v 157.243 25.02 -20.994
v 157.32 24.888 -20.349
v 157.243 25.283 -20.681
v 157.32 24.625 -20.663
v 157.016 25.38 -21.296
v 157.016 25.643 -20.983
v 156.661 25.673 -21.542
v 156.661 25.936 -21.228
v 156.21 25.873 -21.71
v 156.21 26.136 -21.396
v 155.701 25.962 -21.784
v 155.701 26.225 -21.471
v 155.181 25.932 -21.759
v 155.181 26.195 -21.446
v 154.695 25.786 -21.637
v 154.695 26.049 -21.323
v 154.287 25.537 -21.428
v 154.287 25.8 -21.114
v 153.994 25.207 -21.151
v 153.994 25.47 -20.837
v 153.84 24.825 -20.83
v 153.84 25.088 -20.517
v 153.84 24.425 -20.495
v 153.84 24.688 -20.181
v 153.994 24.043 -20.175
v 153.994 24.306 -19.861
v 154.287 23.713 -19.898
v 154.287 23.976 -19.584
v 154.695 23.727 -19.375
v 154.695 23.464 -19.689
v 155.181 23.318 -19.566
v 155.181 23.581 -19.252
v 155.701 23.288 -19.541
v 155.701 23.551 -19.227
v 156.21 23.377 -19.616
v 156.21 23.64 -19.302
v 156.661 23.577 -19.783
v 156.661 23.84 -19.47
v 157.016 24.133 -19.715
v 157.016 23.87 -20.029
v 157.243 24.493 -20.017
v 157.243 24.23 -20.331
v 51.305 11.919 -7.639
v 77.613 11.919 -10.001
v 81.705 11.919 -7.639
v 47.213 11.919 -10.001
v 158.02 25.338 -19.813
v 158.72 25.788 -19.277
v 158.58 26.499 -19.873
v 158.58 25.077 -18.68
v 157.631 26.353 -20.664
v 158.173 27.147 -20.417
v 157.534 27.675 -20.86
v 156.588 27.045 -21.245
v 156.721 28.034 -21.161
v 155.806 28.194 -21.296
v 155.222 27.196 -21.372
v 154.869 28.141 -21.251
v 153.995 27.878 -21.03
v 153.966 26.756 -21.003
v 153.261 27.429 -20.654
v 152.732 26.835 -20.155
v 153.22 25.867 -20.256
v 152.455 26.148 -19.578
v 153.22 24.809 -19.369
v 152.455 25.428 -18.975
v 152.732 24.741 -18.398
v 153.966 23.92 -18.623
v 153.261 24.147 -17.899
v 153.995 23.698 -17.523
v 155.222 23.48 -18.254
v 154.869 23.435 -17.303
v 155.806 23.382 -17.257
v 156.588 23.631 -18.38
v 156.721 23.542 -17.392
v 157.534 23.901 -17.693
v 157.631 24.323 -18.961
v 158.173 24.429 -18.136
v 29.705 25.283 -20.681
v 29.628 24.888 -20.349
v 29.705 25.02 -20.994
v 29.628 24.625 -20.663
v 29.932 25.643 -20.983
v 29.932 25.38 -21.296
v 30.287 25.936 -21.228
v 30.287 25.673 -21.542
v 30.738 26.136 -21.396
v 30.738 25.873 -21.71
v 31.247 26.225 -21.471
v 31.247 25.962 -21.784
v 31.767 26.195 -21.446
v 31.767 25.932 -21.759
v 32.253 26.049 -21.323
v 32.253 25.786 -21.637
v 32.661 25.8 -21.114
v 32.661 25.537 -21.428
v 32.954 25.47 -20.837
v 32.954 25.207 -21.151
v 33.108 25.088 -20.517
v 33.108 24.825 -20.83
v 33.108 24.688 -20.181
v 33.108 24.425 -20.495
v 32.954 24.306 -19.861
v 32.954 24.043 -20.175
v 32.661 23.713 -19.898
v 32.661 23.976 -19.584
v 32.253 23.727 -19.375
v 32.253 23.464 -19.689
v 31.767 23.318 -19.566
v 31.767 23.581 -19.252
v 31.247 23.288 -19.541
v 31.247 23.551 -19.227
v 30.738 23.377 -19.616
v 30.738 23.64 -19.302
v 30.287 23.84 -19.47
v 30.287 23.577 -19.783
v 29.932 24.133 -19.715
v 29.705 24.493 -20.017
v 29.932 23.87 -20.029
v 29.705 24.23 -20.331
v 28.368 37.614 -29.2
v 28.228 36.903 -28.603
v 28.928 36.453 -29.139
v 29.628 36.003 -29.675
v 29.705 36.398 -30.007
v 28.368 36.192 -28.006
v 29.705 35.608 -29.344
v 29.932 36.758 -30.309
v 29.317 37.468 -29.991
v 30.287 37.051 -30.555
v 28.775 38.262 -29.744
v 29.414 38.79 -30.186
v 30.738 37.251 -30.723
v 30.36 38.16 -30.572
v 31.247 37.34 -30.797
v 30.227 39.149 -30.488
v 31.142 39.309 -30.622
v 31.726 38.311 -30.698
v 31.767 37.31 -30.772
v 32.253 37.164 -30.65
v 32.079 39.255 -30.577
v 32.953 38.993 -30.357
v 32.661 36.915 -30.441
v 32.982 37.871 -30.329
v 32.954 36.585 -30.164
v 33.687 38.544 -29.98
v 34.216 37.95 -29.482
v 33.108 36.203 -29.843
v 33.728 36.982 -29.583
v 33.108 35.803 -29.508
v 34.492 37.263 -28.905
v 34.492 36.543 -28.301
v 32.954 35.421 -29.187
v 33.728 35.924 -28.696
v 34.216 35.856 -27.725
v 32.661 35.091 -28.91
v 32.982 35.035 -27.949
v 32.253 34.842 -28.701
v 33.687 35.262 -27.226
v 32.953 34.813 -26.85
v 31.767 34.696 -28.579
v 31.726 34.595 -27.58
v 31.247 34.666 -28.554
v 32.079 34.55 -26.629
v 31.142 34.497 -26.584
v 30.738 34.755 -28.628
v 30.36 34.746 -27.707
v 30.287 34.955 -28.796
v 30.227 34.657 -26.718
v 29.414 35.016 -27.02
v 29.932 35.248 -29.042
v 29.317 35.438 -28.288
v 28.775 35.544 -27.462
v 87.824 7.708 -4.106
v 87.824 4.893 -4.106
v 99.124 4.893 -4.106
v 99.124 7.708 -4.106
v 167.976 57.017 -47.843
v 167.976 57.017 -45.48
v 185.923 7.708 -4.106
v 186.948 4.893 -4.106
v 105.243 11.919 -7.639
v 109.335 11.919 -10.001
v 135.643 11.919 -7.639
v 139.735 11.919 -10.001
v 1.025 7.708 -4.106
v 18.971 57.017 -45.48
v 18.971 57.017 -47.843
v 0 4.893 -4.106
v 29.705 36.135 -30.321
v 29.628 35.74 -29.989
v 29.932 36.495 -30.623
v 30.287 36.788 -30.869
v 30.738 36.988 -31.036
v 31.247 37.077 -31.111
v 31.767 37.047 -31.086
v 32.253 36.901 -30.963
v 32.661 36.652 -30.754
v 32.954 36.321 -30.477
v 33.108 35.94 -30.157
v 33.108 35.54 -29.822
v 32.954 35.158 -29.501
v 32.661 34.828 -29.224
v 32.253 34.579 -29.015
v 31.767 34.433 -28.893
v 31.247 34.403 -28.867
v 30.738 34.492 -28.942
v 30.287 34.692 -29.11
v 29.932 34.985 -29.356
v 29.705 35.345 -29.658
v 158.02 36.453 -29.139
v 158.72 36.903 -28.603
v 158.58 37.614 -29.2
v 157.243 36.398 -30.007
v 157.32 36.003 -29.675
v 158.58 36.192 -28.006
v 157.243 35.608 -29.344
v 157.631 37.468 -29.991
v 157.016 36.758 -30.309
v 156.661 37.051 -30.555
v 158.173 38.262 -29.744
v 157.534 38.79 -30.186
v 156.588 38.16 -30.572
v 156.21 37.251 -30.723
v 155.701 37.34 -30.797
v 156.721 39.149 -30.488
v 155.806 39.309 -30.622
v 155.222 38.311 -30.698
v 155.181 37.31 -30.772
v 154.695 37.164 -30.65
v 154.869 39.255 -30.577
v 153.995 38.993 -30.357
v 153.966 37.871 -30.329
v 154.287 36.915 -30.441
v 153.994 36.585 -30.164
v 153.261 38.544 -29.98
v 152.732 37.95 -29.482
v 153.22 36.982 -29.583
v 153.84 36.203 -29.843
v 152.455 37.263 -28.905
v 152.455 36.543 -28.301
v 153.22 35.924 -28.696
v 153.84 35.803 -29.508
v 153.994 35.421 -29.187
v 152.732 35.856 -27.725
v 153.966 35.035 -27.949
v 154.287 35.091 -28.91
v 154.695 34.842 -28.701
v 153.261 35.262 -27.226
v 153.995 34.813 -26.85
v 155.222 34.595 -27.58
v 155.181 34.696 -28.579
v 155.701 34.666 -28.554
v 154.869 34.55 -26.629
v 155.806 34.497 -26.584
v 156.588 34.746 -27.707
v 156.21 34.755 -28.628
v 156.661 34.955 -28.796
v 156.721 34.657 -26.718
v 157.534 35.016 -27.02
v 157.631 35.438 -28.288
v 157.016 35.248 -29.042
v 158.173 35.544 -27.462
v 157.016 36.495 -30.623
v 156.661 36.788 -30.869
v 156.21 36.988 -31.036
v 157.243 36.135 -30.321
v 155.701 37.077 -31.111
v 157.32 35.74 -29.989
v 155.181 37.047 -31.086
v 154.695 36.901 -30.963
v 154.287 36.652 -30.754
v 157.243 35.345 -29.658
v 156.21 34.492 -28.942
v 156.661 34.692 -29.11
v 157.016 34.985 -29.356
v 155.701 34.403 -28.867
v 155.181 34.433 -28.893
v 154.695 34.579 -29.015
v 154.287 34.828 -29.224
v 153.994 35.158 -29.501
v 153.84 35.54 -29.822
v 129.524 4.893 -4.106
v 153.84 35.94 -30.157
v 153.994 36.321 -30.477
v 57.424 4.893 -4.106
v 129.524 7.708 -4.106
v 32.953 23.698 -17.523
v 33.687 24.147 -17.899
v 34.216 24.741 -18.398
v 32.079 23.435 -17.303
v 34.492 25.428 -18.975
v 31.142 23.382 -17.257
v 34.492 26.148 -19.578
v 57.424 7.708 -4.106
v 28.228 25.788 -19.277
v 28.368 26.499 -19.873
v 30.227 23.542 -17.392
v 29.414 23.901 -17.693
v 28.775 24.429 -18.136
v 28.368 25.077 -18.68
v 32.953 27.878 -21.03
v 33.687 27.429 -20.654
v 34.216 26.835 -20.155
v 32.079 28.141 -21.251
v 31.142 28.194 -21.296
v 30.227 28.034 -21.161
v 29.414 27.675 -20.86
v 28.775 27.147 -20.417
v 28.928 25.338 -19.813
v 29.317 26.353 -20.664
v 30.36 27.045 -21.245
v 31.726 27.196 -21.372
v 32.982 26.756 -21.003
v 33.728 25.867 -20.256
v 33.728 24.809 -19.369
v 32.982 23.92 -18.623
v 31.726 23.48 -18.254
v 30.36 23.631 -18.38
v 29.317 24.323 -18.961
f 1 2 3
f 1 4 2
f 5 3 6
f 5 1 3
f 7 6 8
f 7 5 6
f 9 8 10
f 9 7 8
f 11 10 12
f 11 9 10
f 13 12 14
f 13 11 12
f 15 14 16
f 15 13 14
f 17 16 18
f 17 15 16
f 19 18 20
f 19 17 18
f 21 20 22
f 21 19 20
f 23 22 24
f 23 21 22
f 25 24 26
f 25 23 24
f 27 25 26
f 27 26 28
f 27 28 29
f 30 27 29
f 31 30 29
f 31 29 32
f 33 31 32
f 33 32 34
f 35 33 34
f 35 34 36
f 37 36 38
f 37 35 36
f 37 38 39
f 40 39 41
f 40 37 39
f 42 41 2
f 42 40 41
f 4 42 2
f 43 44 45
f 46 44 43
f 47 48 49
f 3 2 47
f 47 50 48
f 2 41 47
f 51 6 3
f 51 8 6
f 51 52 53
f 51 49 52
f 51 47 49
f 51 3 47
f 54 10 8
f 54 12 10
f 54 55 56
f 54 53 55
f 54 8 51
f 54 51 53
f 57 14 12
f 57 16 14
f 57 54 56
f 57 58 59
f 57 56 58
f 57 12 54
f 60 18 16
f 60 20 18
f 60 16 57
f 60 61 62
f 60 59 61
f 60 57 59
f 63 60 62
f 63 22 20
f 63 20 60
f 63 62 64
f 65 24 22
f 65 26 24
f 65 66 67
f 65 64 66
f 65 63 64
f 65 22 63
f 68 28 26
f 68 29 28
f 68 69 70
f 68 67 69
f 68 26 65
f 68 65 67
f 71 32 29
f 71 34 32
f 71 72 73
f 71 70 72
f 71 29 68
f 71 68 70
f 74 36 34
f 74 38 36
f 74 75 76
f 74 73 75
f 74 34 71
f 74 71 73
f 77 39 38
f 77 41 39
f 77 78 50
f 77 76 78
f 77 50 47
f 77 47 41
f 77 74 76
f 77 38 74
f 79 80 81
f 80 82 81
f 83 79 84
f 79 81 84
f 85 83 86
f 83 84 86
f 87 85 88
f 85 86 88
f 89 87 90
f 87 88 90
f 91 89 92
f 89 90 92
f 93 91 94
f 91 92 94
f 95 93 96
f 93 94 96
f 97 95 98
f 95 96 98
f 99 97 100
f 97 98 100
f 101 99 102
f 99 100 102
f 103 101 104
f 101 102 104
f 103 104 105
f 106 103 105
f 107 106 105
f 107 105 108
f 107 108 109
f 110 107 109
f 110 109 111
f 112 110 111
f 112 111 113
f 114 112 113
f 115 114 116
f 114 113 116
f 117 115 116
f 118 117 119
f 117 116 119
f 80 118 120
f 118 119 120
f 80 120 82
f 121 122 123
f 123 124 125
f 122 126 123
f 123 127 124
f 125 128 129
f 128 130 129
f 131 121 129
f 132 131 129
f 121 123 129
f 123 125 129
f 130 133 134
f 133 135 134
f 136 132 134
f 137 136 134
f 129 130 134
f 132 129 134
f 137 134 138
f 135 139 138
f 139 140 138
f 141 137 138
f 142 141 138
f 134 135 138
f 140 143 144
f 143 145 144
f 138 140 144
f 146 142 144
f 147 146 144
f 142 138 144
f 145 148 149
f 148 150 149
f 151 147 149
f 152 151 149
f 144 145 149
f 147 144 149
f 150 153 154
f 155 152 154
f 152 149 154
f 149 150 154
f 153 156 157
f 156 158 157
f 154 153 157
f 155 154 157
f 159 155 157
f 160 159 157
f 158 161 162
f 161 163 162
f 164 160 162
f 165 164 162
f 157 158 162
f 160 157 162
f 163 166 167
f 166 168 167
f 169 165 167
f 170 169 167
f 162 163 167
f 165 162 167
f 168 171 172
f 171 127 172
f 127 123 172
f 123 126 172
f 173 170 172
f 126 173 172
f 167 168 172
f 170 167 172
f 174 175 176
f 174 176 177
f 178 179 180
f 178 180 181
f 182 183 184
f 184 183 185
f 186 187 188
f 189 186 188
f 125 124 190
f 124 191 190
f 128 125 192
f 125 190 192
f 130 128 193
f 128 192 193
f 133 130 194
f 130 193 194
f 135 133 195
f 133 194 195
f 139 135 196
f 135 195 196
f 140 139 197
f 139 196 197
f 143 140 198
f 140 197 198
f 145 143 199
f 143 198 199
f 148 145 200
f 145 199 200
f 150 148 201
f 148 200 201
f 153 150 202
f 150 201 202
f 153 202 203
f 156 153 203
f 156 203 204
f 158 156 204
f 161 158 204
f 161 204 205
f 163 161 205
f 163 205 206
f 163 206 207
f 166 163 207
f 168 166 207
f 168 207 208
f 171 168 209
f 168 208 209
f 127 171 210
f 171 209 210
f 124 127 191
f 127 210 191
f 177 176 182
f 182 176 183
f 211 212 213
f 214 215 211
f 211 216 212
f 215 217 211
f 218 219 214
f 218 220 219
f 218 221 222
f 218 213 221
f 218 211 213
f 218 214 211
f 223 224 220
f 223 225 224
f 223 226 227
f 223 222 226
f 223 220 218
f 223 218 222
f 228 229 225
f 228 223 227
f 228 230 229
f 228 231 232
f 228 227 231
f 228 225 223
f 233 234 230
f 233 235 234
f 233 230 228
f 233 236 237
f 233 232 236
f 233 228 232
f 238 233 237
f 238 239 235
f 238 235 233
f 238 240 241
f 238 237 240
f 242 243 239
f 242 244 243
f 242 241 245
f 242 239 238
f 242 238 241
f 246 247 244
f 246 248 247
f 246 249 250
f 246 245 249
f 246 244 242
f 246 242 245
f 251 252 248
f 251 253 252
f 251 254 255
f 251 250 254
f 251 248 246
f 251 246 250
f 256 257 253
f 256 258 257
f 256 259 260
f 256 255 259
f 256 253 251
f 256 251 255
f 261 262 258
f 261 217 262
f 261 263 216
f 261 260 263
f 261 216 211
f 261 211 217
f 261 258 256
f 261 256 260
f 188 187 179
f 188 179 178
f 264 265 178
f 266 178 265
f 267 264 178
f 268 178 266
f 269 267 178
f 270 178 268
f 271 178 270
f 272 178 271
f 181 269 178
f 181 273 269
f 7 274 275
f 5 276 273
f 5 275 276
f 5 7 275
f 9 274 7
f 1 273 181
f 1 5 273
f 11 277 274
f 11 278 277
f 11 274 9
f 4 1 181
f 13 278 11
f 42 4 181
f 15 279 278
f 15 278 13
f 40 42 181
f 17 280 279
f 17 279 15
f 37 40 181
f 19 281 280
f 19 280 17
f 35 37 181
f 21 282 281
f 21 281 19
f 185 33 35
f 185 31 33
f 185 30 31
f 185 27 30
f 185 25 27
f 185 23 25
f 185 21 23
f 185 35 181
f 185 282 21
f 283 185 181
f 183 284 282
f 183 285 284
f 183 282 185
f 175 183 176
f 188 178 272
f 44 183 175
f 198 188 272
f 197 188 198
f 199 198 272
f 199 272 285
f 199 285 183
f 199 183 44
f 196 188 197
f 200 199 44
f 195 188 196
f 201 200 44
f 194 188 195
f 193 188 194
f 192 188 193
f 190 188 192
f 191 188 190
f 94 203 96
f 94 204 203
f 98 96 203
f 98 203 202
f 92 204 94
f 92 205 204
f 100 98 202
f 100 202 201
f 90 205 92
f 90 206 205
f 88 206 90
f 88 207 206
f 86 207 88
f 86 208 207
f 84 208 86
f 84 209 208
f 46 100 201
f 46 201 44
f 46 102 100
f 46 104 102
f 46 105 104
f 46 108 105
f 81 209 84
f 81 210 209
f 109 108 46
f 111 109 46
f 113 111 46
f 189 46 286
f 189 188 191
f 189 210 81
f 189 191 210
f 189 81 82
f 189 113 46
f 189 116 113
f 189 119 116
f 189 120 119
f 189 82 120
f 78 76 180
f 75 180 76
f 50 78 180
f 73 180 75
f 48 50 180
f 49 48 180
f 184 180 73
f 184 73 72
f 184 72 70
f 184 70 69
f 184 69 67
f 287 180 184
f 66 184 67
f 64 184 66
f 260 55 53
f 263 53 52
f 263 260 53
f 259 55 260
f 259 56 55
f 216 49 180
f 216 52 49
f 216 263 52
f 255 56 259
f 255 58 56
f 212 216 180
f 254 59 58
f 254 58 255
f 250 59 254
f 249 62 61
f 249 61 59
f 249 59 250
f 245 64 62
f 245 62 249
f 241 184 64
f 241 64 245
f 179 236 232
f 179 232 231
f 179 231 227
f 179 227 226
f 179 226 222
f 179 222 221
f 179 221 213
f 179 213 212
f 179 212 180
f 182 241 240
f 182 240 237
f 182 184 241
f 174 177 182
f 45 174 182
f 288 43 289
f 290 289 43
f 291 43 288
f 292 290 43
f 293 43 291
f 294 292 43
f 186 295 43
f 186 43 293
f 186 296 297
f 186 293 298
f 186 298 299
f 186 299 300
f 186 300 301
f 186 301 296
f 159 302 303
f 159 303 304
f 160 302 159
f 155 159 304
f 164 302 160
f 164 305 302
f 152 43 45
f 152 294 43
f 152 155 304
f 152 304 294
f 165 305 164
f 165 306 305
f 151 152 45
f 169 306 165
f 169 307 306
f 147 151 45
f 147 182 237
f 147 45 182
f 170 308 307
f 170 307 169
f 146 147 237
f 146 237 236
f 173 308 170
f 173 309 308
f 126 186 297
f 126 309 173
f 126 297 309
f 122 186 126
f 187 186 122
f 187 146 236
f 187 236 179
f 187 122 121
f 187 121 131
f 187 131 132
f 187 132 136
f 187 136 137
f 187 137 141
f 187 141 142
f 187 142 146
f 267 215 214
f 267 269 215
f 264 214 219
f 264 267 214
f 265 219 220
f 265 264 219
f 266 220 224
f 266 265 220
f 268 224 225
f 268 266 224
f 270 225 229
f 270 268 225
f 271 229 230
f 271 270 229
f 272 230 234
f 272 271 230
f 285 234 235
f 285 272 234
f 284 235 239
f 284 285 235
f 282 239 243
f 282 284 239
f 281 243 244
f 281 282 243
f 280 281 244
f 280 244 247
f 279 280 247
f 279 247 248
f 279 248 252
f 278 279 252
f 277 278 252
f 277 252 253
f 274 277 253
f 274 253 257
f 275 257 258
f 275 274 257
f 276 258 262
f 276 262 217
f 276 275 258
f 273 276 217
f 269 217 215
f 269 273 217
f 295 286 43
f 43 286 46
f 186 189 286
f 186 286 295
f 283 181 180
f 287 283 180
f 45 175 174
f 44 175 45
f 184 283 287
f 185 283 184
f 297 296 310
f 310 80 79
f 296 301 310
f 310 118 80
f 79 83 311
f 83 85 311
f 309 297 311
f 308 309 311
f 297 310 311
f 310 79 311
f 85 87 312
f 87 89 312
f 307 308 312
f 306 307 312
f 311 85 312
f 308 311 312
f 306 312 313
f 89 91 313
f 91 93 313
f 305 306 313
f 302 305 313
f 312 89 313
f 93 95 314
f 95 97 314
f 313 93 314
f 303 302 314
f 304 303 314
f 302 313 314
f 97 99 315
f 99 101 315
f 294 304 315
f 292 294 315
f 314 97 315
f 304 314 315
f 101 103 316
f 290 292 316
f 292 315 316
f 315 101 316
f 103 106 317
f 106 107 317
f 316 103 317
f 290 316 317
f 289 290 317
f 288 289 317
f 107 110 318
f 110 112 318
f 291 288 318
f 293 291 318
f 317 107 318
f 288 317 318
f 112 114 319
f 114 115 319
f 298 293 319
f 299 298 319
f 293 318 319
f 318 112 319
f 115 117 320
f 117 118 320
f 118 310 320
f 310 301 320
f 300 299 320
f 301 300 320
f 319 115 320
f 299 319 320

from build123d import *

# Parameters (mm, degrees)
BOSS_EXTRUDE1_DEPTH                             = 186.947944
CUT_EXTRUDE1_DEPTH                              = 202.219677631
CUT_EXTRUDE2_DEPTH                              = 119.891891944
CSK_FOR_M3_FLAT_HEAD_MACHINE_SCREW1_D           = 3.5
CSK_FOR_M3_FLAT_HEAD_MACHINE_SCREW1_DEPTH       = 5
CSK_FOR_M3_FLAT_HEAD_MACHINE_SCREW1_CSINK_D     = 6.3
CSK_FOR_M3_FLAT_HEAD_MACHINE_SCREW1_CSINK_ANGLE = 90
CUT_EXTRUDE3_REACH                              = 142.174
SKETCH7_W                                       = 15.2
SKETCH7_H                                       = 7
SKETCH7_H_2                                     = 1


with BuildPart() as part:
    # Sketch2 → Boss-Extrude1 (new body)
    with BuildSketch(Plane(origin=(0, 0, 0), x_dir=(0, 0, -1), z_dir=(1, 0, 0))):
        Polygon((0, 0), (-2.3622, 0), (45.480481789, 57.016687901), (47.842681789, 57.016687901), align=None)
    extrude(amount=BOSS_EXTRUDE1_DEPTH)

    # Sketch3 → Cut-Extrude1 (cut, through all)
    with BuildSketch(Plane.ZY):
        Polygon((-4.105707607, 4.89299179), (-4.105707607, 7.708152127), (2.3622, 0), (0, 0), align=None)
    extrude(amount=-CUT_EXTRUDE1_DEPTH, mode=Mode.SUBTRACT)

    # Sketch4 → Cut-Extrude2 (cut, through all)
    with BuildSketch(Plane(origin=(93.496468894, -1.981357522, -4.105707607), x_dir=(-1, 0, 0), z_dir=(0, 0, -1))):
        Polygon((93.496468894, 58.998045423), (74.524995009, 58.998045423), (93.496468894, 6.874349312), align=None)
        Polygon((-93.451475106, 6.874349312), (-93.451475106, 58.998045423), (-74.480001222, 58.998045423), align=None)
    extrude(amount=CUT_EXTRUDE2_DEPTH, mode=Mode.SUBTRACT)

    # CSK for M3 Flat Head Machine Screw1
    with Locations(Plane(origin=(0, 1.163156437, 1.386195863), x_dir=(1, 0, 0), z_dir=(0, 0.6427876096865435, 0.7660444431189745))):
        with Locations((31.377677493, 46.65493708), (31.377677493, 32.145498062)):
            csk_for_m3_flat_head_machine_screw1 = CounterSinkHole(CSK_FOR_M3_FLAT_HEAD_MACHINE_SCREW1_D / 2, CSK_FOR_M3_FLAT_HEAD_MACHINE_SCREW1_CSINK_D / 2, depth=CSK_FOR_M3_FLAT_HEAD_MACHINE_SCREW1_DEPTH, counter_sink_angle=CSK_FOR_M3_FLAT_HEAD_MACHINE_SCREW1_CSINK_ANGLE)

    # Mirror1: CSK for M3 Flat Head Machine Screw1 across plane
    add(csk_for_m3_flat_head_machine_screw1.mirror(Plane(origin=(93.473972, 0, 0), x_dir=(0, 0, 1), z_dir=(1, 0, 0))), mode=Mode.SUBTRACT)

    # Cut-Extrude3: up to this plane
    cut_extrude3_end = Plane(origin=(186.947944, 0, 2.3622), z_dir=(0, -0.6427876096865434, -0.7660444431189748))
    # Sketch7 → Cut-Extrude3 (cut, up to the surface)
    with BuildSketch(Plane(origin=(112.633038957, 0, -65.028715361), x_dir=(0.4999999999999981, -1.9080601945838373e-15, 0.8660254037844397), z_dir=(-0.8660254037844397, 3.3048572009189827e-15, 0.4999999999999981)), mode=Mode.PRIVATE) as cut_extrude3_sk1:
        with Locations((53.60637797, 8.418642478)):
            Rectangle(SKETCH7_W, SKETCH7_H)
    cut_extrude3_tool1 = split(extrude(cut_extrude3_sk1.sketch, amount=CUT_EXTRUDE3_REACH, mode=Mode.PRIVATE), bisect_by=cut_extrude3_end, keep=Keep.BOTH, mode=Mode.PRIVATE)
    # Sketch7 → Cut-Extrude3 (cut, up to the surface)
    with BuildSketch(Plane(origin=(112.633038957, 0, -65.028715361), x_dir=(0.4999999999999981, -1.9080601945838373e-15, 0.8660254037844397), z_dir=(-0.8660254037844397, 3.3048572009189827e-15, 0.4999999999999981)), mode=Mode.PRIVATE) as cut_extrude3_sk2:
        with Locations((53.60637797, 4.418642478)):
            Rectangle(SKETCH7_W, SKETCH7_H_2)
    cut_extrude3_tool2 = split(extrude(cut_extrude3_sk2.sketch, amount=CUT_EXTRUDE3_REACH, mode=Mode.PRIVATE), bisect_by=cut_extrude3_end, keep=Keep.BOTH, mode=Mode.PRIVATE)
    cut_extrude3 = cut_extrude3_tool1.solids().sort_by_distance((139.436228, 8.418642, -18.60423))[0] + cut_extrude3_tool2.solids().sort_by_distance((139.436228, 4.418642, -18.60423))[0]
    add(cut_extrude3, mode=Mode.SUBTRACT)

    # Mirror2: Cut-Extrude3 across plane
    add(cut_extrude3.mirror(Plane(origin=(93.473972, 0, 0), x_dir=(0, 0, 1), z_dir=(1, 0, 0))), mode=Mode.SUBTRACT)


solid = part.part
